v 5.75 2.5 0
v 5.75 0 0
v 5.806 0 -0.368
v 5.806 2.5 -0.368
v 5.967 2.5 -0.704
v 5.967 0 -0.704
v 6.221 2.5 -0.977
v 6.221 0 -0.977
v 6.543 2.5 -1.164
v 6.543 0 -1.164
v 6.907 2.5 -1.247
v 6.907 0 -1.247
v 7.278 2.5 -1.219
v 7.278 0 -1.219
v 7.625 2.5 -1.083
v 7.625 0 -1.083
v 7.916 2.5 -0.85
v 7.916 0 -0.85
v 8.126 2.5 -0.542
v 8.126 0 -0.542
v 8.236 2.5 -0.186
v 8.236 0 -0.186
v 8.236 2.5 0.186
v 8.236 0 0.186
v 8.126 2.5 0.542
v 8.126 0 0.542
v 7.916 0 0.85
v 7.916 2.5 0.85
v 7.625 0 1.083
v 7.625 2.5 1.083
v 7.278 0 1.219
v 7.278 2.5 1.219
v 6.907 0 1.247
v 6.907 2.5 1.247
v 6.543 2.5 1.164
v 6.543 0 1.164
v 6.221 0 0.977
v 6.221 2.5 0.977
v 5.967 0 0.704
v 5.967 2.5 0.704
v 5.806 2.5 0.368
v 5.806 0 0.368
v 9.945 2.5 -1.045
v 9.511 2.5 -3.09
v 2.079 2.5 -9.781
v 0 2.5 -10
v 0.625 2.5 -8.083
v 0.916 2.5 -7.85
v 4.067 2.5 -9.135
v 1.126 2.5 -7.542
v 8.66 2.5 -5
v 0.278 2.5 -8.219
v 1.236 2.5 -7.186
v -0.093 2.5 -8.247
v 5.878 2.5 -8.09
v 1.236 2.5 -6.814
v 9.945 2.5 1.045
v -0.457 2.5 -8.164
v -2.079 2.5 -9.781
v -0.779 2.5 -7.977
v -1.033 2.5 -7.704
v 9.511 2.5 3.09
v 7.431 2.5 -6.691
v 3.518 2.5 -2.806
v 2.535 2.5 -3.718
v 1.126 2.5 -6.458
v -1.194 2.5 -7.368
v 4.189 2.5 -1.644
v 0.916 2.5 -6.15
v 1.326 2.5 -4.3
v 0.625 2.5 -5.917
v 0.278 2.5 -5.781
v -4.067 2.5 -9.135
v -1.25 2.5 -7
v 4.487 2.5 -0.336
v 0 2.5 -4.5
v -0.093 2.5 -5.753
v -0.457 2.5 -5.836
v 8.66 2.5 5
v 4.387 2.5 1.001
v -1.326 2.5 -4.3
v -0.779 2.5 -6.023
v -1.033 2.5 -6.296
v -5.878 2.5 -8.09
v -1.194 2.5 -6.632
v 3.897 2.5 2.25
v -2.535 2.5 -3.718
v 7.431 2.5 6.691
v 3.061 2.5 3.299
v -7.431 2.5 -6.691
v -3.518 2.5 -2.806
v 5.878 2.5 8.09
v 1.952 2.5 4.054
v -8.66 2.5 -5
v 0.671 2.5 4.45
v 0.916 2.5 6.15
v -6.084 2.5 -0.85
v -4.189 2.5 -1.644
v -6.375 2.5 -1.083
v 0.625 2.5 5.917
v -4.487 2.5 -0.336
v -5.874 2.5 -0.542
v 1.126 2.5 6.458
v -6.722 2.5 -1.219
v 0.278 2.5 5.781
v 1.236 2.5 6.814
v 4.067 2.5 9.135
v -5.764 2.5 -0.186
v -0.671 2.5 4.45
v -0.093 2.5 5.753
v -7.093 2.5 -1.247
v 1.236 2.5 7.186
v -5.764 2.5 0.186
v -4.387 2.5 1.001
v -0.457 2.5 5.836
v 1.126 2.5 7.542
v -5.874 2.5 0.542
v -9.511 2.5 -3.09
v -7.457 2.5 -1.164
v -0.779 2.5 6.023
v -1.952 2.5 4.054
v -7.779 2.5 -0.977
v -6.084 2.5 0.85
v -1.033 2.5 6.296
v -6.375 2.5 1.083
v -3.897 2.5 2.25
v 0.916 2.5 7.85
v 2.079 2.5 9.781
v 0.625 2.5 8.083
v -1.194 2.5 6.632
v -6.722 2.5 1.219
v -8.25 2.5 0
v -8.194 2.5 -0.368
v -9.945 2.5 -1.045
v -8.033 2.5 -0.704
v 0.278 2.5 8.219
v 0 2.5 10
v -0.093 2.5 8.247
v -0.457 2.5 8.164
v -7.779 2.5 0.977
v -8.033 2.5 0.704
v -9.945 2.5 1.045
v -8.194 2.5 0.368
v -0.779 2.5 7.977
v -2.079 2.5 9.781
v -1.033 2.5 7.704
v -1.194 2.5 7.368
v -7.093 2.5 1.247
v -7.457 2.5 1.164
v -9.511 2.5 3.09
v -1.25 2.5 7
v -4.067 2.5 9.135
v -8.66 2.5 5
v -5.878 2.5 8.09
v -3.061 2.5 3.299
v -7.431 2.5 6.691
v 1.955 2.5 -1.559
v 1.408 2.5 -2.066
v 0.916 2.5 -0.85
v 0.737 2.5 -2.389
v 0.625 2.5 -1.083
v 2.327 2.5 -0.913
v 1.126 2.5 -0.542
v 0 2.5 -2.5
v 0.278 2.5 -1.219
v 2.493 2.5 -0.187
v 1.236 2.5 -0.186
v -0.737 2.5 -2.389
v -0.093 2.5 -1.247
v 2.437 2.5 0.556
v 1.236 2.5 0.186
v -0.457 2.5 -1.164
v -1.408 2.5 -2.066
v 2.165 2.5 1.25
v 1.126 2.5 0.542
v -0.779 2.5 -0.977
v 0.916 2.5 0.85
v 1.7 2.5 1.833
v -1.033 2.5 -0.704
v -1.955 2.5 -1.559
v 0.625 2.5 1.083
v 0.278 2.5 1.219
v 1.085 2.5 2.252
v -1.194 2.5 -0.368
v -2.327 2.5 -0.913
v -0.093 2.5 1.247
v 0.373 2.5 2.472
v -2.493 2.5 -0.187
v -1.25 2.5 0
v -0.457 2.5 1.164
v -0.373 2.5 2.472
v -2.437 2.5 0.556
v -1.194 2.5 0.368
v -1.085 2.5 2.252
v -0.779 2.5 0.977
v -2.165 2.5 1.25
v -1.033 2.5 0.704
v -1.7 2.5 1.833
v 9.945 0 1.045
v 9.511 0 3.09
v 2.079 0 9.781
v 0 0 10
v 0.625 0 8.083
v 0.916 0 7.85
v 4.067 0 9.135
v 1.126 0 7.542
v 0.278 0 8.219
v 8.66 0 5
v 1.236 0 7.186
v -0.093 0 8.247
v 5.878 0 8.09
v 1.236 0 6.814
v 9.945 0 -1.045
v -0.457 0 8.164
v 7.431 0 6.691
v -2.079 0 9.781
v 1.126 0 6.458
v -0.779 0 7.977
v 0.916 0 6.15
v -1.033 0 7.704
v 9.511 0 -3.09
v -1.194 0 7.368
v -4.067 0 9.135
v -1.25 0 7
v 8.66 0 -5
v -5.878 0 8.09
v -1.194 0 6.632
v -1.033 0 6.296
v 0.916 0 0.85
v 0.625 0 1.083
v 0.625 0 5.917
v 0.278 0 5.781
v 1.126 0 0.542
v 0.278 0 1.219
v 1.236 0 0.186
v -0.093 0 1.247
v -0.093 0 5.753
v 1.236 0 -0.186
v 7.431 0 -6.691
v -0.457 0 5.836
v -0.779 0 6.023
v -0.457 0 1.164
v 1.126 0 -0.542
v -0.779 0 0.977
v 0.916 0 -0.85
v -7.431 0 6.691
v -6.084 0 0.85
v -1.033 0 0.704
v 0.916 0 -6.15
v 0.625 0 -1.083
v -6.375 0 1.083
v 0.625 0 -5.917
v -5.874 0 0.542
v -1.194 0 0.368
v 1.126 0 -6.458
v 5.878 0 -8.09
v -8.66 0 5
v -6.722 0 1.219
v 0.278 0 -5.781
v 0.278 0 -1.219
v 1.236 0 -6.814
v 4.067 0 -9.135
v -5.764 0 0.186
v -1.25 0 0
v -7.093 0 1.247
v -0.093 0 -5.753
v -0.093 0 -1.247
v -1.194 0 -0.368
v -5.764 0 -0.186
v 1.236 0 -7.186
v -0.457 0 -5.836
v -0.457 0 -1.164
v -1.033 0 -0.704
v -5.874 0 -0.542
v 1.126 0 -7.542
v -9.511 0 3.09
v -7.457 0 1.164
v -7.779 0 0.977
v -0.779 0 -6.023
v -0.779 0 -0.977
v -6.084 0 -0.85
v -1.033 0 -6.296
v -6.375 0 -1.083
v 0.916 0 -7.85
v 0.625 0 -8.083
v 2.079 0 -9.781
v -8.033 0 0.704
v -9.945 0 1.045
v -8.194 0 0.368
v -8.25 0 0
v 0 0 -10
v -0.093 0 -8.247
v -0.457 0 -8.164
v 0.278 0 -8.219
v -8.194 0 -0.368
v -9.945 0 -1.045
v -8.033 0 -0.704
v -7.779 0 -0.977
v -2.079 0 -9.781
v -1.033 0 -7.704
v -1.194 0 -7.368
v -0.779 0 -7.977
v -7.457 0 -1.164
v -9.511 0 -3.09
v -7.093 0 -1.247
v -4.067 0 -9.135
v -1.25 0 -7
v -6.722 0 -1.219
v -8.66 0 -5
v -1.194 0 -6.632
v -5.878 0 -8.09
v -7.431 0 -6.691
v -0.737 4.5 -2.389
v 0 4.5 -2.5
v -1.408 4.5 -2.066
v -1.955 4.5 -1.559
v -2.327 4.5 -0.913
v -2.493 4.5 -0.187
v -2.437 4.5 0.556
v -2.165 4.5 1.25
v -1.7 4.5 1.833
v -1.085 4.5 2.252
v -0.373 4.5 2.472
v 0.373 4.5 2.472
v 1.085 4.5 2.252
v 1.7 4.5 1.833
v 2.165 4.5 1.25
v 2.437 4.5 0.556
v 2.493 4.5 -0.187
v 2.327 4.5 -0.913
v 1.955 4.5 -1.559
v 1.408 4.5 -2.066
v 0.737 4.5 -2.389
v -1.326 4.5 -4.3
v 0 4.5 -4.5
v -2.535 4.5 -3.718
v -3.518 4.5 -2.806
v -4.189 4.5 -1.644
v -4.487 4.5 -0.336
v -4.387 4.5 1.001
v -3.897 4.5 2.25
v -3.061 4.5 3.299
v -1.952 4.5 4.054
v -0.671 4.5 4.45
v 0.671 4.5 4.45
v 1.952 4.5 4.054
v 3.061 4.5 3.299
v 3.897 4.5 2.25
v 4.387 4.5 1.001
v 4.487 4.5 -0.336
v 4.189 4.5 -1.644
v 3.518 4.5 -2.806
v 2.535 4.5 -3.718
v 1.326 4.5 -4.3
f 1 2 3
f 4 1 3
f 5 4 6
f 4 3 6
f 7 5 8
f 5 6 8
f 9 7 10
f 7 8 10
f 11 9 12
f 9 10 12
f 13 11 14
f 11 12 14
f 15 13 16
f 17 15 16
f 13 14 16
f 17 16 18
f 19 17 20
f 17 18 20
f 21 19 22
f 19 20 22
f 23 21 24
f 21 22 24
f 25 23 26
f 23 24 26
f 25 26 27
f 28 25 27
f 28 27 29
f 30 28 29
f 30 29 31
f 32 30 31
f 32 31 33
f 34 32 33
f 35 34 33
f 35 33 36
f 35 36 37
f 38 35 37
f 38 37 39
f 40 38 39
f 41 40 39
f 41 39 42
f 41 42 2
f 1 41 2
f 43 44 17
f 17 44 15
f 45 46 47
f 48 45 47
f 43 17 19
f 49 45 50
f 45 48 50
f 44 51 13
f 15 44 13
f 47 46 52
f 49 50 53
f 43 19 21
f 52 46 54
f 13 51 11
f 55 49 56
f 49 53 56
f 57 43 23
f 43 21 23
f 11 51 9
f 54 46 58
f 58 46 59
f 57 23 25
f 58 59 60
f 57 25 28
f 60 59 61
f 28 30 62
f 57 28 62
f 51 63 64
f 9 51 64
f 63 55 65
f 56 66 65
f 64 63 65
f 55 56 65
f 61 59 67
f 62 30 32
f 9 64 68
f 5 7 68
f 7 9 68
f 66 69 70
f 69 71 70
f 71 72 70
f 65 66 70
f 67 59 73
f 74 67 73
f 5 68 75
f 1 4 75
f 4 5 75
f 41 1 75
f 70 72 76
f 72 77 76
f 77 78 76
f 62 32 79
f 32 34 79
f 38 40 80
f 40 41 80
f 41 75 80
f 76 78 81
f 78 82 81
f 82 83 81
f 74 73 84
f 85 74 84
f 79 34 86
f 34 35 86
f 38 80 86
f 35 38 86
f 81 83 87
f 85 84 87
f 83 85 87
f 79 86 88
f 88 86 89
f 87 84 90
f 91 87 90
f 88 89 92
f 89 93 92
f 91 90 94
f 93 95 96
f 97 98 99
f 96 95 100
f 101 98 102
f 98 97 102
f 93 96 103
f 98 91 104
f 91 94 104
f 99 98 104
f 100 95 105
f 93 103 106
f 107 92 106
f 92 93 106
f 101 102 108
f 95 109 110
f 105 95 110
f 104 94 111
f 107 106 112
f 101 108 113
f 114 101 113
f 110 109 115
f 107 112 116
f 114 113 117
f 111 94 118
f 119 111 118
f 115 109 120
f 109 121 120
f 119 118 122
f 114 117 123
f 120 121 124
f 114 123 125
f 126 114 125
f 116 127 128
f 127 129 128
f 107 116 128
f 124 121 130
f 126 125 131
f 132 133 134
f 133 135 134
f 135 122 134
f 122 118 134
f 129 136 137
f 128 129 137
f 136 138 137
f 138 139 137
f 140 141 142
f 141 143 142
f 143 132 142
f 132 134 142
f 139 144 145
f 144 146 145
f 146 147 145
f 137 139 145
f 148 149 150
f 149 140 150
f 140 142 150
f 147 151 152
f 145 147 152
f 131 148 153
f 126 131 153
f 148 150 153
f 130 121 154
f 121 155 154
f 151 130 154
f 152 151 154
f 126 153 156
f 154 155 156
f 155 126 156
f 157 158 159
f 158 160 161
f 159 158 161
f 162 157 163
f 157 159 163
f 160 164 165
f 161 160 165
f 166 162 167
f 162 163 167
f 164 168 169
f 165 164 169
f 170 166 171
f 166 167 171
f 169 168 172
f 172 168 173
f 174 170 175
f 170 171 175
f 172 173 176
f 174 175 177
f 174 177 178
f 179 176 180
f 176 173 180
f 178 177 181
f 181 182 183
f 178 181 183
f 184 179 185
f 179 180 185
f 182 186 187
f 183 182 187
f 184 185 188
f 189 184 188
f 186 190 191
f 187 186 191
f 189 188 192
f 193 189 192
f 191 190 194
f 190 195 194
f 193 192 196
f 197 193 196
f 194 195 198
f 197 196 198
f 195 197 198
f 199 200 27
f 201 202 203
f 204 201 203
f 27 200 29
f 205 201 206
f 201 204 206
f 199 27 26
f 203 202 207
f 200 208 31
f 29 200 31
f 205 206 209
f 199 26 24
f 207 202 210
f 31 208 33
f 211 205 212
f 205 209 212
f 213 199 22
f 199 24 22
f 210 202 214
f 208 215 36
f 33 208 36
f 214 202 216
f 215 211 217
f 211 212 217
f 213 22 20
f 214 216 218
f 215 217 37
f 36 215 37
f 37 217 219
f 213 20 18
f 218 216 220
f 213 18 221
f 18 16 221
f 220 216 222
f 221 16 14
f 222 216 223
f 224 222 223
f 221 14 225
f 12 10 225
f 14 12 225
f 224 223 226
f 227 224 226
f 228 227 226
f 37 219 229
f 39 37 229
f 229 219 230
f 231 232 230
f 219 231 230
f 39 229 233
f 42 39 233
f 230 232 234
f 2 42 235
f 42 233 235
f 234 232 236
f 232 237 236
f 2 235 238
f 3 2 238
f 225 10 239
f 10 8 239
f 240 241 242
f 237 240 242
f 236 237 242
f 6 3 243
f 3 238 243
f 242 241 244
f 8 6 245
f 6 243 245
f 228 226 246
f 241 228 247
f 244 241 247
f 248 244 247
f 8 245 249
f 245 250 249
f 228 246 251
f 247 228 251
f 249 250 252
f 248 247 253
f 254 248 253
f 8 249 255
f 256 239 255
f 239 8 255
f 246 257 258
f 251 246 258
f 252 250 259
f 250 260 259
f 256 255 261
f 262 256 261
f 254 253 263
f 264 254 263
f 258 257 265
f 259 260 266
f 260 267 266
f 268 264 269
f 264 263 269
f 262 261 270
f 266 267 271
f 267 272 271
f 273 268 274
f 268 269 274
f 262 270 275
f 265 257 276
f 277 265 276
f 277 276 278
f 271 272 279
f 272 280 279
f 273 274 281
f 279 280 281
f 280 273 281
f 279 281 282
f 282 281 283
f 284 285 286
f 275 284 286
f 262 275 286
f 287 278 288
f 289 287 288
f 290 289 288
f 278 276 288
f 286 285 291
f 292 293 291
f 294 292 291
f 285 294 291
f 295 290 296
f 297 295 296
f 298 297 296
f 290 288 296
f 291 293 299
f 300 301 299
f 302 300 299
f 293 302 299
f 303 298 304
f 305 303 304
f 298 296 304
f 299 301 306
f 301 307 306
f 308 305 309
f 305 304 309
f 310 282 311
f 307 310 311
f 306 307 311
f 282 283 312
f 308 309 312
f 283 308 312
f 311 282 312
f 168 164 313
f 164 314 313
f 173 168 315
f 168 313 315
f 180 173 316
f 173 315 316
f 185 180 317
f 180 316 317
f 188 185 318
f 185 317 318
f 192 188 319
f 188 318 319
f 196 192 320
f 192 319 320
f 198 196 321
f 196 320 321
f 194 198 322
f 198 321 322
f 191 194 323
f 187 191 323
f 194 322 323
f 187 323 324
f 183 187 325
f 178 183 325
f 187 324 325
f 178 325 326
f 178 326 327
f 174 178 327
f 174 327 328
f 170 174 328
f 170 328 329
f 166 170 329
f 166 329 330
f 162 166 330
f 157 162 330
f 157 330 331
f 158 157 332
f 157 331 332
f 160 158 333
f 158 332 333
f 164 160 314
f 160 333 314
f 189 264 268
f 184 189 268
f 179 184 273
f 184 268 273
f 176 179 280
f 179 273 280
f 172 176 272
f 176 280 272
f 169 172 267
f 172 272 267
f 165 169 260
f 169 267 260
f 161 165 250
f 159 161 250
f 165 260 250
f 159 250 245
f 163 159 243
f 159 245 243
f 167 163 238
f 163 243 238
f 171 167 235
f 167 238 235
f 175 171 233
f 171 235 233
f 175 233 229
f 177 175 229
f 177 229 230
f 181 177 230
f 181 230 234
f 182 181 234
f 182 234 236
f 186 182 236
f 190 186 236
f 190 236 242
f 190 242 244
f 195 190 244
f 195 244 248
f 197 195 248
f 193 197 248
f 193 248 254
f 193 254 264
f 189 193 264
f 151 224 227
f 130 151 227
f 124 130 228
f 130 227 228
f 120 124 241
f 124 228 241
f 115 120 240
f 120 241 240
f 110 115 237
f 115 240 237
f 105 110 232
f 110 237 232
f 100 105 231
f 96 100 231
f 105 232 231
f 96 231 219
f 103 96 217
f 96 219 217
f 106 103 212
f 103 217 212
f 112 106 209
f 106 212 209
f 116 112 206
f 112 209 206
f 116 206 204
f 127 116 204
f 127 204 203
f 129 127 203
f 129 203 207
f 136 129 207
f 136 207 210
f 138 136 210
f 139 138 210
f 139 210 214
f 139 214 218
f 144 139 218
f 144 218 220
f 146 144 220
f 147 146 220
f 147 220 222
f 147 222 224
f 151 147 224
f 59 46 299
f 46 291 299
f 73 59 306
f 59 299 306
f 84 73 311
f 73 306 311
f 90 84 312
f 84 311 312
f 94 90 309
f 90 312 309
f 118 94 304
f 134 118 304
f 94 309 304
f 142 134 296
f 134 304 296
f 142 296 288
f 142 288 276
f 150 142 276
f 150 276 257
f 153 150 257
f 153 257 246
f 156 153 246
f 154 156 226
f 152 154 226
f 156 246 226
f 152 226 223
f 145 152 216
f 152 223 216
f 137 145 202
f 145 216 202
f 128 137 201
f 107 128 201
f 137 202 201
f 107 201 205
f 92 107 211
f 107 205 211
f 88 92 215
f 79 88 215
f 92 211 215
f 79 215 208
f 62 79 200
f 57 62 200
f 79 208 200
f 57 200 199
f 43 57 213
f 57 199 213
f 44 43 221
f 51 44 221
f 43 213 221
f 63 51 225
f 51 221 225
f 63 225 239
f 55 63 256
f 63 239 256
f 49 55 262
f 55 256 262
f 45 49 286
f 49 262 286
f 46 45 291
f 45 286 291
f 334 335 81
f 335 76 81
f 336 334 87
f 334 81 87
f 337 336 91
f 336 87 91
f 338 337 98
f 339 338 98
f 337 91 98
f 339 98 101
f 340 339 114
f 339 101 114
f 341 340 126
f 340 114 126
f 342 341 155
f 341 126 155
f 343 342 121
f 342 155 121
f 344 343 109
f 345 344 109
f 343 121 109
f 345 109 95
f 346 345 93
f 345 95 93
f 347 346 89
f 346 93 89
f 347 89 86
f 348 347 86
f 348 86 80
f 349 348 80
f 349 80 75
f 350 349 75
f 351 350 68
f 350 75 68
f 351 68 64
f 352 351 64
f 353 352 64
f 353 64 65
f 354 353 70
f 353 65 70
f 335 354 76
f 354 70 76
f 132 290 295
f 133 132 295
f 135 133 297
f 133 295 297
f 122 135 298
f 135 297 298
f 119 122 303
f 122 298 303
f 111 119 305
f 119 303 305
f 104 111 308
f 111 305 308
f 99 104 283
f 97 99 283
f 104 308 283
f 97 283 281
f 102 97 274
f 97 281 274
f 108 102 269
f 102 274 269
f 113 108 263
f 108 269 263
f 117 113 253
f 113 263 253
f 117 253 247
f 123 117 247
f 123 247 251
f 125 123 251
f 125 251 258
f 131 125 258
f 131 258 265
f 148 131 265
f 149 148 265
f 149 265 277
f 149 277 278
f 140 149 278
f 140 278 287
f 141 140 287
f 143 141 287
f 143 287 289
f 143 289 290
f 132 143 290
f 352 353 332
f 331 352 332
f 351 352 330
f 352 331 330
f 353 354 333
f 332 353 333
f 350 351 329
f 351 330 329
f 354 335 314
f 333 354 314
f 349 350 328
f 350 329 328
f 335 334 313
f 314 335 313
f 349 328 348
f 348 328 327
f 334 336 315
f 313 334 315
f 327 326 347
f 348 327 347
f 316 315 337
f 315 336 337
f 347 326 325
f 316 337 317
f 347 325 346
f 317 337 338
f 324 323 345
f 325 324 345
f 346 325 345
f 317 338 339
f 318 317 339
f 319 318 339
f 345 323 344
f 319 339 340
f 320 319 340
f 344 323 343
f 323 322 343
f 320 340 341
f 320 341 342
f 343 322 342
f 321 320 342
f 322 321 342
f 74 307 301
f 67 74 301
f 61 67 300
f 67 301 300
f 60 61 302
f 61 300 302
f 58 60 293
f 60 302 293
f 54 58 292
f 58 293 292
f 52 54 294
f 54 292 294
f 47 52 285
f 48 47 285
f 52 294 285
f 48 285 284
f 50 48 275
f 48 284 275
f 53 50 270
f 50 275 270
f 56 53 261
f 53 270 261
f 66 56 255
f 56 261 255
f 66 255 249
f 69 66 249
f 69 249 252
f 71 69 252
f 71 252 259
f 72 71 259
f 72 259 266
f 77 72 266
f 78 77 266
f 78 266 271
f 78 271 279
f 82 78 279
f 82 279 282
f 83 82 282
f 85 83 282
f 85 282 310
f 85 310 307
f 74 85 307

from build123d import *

# Parameters (mm, degrees)
TAP_DRILL_FOR_M3X0_5_TAP1_D = 2.5


with BuildPart() as part:
    # Sketch2 → Revolve1 (revolve)
    with BuildSketch(Plane.XY):
        Polygon((0, 2.5), (2.5, 2.5), (2.5, 4.5), (4.5, 4.5), (4.5, 2.5), (10, 2.5), (10, 0), (0, 0), align=None)
    revolve(axis=Axis((0, 0, 0), (0, 1, 0)))

    # Tap Drill for M3x0.5 Tap1 (through all)
    with Locations(Plane(origin=(0, 2.5, 0), x_dir=(1, 0, 0), z_dir=(0, 1, 0))):
        with Locations((0, 7), (0, -7), (-7, 0), (7, 0), (0, 0)):
            Hole(TAP_DRILL_FOR_M3X0_5_TAP1_D / 2)


solid = part.part
